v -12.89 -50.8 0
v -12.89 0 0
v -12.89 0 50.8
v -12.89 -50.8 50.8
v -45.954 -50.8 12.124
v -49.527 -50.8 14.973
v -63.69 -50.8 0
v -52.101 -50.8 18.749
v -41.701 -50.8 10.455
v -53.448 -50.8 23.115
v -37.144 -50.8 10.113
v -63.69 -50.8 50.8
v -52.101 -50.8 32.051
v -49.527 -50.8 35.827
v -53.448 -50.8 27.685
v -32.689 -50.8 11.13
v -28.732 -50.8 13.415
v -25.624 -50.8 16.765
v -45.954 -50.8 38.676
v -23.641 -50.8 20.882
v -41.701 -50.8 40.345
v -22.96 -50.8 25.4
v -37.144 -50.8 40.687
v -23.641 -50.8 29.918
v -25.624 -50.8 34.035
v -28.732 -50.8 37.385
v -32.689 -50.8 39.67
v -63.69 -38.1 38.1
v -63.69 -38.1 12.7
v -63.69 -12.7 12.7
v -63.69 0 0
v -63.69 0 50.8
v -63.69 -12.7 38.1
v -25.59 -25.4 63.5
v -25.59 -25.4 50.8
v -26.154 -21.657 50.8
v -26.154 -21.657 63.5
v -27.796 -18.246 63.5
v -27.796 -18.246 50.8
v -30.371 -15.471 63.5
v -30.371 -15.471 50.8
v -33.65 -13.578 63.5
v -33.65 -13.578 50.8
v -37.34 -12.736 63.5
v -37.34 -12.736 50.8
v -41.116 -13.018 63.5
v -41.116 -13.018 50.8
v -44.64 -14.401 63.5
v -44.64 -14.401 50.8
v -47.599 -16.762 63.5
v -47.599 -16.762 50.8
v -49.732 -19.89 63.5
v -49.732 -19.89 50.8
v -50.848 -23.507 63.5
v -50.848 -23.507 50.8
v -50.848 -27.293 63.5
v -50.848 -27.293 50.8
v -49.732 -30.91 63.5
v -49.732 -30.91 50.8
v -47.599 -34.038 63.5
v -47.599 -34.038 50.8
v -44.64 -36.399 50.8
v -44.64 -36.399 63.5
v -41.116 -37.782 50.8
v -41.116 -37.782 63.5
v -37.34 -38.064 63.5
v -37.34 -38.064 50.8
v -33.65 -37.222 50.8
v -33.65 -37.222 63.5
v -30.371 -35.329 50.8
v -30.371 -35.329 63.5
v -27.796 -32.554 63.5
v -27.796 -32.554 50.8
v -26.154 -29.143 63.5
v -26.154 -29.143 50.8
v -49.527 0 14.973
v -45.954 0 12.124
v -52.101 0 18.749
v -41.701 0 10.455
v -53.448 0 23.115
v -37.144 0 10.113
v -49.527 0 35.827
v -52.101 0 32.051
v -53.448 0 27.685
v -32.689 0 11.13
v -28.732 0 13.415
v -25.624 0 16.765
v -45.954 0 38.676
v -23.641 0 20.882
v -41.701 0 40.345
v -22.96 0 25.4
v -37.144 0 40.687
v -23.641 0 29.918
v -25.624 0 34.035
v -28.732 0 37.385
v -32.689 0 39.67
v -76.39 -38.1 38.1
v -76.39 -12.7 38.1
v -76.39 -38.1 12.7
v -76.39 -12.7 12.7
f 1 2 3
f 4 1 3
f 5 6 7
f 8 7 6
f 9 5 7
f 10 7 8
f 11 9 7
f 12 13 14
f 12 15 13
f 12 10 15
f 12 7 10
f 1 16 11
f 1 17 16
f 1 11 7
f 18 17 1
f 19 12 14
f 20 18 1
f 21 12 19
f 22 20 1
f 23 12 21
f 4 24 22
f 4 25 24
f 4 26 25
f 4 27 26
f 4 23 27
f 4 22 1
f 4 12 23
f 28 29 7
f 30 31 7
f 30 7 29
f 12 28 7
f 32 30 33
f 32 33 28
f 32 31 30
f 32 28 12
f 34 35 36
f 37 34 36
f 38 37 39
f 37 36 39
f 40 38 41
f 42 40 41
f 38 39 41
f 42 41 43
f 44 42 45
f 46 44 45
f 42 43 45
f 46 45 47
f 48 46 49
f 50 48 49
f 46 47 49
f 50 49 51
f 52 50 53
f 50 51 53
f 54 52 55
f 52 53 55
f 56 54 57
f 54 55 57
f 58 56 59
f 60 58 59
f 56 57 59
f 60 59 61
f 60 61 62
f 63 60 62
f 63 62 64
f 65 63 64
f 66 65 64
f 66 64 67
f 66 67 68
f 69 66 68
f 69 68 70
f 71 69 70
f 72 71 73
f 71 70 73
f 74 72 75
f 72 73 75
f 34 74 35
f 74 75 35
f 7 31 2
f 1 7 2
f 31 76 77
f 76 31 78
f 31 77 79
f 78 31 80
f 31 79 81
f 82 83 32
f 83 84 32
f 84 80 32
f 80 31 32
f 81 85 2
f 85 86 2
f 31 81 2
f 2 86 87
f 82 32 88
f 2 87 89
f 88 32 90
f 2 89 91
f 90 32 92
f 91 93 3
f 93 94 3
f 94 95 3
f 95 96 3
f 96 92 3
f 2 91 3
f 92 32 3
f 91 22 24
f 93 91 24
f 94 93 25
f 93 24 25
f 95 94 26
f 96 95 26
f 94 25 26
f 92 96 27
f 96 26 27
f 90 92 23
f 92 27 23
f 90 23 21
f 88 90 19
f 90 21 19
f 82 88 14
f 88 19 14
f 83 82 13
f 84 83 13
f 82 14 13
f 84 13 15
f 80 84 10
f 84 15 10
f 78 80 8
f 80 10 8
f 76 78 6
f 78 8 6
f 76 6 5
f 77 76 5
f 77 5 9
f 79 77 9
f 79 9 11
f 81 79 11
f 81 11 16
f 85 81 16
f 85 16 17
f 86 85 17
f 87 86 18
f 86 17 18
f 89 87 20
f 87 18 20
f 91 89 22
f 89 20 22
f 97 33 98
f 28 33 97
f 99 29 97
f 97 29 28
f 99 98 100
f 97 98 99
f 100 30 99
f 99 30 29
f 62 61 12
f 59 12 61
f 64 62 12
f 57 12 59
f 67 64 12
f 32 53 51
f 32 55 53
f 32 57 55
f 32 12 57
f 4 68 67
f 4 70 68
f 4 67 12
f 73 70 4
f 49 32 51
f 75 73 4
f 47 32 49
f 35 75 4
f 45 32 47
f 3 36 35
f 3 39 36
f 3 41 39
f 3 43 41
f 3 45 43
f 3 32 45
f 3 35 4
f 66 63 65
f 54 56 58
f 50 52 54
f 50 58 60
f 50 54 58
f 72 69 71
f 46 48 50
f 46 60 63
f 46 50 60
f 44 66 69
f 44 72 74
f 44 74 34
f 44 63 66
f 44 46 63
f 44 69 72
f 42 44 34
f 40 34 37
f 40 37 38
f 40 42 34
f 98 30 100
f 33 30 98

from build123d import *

# Parameters (mm, degrees)
F0_W     = 50.8
F0_H     = 50.8
F1_DEPTH = 50.8
F2_R     = 15.329647
F3_DEPTH = 50.8
F4_R     = 12.7
F5_DEPTH = 12.7
F6_W     = 25.4
F6_H     = 25.4
F7_DEPTH = 12.7


with BuildPart() as f1:
    # F0 (on Front) → F1 (new body)
    with BuildSketch(Plane.XZ):
        with Locations((-38.289552, 25.4)):
            Rectangle(F0_W, F0_H)
    extrude(amount=F1_DEPTH)

    # F2 (on face) → F3 (cut)
    with BuildSketch(Plane.XZ.offset(50.8)):
        with Locations((-38.289552, 25.4)):
            Circle(F2_R)
    extrude(amount=-F3_DEPTH, mode=Mode.SUBTRACT)

    # F4 (on face) → F5 (join)
    with BuildSketch(Plane.XY.offset(50.8)):
        with Locations((-38.289552, -25.4)):
            Circle(F4_R)
    extrude(amount=F5_DEPTH)

    # F6 (on face) → F7 (join)
    with BuildSketch(Plane(origin=(-63.689552, 0, 0), x_dir=(0, -1, 0), z_dir=(-1, 0, 0))):
        with Locations((25.4, 25.4)):
            Rectangle(F6_W, F6_H)
    extrude(amount=F7_DEPTH)


solid = f1.part
